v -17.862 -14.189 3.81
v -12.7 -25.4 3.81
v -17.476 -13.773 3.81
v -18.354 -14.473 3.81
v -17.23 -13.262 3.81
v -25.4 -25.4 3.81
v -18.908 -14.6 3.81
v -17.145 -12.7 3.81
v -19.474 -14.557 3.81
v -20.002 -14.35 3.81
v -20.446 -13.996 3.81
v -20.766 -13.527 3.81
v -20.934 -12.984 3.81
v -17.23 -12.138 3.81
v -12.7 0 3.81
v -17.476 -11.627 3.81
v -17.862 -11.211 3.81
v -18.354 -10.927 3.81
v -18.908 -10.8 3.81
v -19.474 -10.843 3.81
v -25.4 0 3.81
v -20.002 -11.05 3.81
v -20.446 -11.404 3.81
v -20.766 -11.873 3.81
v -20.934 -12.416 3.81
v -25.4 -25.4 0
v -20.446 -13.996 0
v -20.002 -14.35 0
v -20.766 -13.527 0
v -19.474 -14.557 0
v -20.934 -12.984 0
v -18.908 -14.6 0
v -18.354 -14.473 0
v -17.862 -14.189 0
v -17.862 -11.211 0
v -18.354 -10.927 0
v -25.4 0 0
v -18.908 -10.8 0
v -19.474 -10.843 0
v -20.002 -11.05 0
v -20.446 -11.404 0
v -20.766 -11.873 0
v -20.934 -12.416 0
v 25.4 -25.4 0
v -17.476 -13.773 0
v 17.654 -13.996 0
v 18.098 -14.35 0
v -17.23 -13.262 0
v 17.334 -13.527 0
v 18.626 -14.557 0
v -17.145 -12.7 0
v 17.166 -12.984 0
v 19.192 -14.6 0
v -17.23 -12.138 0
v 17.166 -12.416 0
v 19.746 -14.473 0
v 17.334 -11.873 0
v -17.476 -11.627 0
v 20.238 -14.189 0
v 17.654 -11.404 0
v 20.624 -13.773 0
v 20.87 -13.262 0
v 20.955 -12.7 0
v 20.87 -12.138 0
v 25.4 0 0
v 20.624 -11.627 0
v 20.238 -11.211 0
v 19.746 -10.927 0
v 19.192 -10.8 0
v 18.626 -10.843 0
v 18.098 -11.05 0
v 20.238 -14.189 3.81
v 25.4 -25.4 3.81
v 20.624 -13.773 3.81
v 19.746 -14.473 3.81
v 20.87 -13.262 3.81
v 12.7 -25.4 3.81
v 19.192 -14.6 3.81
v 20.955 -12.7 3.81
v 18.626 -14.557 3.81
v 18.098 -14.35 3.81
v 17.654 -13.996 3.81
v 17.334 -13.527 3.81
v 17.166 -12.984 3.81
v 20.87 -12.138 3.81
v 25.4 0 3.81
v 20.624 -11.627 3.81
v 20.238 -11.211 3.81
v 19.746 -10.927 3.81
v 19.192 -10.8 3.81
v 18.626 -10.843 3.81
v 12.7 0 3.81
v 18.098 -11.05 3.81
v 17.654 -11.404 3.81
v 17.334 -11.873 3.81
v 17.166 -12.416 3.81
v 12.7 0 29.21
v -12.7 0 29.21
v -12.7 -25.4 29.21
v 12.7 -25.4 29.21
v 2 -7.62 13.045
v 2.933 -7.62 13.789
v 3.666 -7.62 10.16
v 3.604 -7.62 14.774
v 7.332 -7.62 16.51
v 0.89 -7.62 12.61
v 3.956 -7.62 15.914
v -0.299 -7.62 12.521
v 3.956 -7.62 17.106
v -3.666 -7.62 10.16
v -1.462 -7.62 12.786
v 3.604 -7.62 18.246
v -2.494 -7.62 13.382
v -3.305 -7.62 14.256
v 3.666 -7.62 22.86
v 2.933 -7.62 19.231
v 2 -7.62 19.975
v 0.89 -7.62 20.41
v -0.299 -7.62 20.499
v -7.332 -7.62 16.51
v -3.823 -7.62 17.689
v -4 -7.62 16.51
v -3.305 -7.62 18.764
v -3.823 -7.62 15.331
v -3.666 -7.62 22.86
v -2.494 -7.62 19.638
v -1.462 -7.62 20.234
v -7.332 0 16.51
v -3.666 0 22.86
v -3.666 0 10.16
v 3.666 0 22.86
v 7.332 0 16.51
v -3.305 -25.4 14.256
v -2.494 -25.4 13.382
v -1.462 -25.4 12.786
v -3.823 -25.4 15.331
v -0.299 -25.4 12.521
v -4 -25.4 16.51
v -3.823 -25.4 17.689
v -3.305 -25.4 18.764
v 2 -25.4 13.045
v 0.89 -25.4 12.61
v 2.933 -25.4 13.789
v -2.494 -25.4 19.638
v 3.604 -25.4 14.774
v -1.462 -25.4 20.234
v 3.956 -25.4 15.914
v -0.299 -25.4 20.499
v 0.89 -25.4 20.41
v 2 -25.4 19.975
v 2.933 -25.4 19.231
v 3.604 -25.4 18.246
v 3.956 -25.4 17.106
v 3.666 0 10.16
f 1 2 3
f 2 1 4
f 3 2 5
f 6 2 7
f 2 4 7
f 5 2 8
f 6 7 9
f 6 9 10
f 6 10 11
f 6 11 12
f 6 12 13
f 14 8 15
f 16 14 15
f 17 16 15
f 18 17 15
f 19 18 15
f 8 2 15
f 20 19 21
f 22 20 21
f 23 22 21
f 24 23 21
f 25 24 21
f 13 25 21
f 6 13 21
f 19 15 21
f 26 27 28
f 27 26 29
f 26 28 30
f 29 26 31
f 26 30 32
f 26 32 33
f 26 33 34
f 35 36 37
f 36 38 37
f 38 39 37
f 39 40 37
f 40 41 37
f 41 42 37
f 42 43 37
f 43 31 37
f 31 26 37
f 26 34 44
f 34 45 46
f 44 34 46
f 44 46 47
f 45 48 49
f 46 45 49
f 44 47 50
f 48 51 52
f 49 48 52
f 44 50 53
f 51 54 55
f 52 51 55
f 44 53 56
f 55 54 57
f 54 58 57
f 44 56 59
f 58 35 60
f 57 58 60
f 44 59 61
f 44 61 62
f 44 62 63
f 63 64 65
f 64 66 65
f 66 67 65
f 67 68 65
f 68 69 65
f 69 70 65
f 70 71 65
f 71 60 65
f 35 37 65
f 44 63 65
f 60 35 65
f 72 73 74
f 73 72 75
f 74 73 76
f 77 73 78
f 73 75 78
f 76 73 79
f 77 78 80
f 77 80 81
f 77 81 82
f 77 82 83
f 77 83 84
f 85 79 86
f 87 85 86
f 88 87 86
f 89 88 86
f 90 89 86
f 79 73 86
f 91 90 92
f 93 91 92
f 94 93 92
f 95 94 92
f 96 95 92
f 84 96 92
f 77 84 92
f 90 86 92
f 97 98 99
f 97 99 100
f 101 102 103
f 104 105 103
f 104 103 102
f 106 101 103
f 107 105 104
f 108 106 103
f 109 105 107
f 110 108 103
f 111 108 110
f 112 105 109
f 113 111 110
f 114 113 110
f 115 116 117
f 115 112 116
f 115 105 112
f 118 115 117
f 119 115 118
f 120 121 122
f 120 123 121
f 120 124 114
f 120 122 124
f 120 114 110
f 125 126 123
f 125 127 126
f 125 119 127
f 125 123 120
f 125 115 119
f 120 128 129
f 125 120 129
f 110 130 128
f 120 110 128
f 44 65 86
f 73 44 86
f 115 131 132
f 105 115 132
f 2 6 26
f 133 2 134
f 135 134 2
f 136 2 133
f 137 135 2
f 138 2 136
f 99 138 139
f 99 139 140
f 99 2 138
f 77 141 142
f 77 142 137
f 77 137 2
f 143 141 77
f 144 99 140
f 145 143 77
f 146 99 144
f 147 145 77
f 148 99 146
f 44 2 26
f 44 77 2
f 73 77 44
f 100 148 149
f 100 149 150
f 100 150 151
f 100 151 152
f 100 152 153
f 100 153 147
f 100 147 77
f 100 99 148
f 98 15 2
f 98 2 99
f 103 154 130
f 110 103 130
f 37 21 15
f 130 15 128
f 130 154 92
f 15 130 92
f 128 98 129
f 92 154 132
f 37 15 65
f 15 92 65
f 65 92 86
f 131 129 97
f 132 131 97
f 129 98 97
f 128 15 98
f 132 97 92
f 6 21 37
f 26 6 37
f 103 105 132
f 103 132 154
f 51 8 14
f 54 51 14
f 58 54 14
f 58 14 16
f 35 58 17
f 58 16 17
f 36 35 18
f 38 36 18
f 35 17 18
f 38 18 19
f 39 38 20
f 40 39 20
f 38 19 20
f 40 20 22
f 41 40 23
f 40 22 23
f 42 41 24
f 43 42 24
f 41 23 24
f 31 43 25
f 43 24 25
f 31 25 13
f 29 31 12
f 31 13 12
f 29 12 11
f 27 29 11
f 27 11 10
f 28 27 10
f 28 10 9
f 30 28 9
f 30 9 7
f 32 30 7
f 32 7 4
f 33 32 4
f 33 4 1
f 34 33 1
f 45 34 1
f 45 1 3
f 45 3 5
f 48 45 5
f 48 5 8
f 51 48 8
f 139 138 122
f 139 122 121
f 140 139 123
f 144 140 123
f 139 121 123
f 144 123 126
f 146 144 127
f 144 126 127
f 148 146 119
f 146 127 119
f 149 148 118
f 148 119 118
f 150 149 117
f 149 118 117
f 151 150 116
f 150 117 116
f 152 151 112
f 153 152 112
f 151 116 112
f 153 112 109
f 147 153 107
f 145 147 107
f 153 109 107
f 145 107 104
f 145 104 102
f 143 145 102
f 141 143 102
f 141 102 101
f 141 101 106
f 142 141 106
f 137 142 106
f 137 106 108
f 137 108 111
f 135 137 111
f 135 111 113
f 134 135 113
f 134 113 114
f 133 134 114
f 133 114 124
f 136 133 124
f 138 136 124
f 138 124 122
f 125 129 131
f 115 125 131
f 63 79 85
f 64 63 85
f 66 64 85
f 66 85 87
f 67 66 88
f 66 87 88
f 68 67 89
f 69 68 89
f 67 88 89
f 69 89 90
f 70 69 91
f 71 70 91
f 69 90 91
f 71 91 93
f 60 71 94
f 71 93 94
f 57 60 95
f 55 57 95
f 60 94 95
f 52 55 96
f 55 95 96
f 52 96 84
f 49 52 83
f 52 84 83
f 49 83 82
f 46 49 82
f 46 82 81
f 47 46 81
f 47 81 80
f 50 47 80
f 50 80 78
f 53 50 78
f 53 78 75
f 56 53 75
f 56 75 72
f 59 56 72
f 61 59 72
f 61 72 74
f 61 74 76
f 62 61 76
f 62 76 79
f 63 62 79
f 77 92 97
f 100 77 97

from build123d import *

# Parameters (mm, degrees)
F0_W     = 25.4
F0_H     = 25.4
F1_DEPTH = 25.4
F2_R     = 4.0005
F3_DEPTH = 25.401
F4_R     = 4.0005
F5_DEPTH = 7.62
F6_R     = 1.905
F7_DEPTH = 25.4


with BuildPart() as f1:
    # F0 (on Front) → F1 (new body)
    with BuildSketch(Plane.XZ):
        with Locations((0, 16.51)):
            Rectangle(F0_W, F0_H)
        Polygon((-25.4, 3.81), (-25.4, 0), (25.4, 0), (25.4, 3.81), (12.7, 3.81), (-12.7, 3.81), align=None)
    extrude(amount=F1_DEPTH)

    # F2 (on face) → F3 (cut, through all)
    with BuildSketch(Plane(origin=(0, 0, 0), x_dir=(-1, 0, 0), z_dir=(0, 1, 0))):
        with Locations((0, 16.51)):
            Circle(F2_R)
    extrude(amount=-F3_DEPTH, mode=Mode.SUBTRACT)

    # F4 (on face) → F5 (cut)
    with BuildSketch(Plane(origin=(0, 0, 0), x_dir=(-1, 0, 0), z_dir=(0, 1, 0))):
        Polygon((7.332348, 16.51), (3.666174, 22.86), (-3.666174, 22.86), (-7.332348, 16.51), (-3.666174, 10.16), (3.666174, 10.16), align=None)
        with Locations((0, 16.51)):
            Circle(F4_R, mode=Mode.SUBTRACT)
    extrude(amount=-F5_DEPTH, mode=Mode.SUBTRACT)

    # F6 (on face) → F7 (cut)
    with BuildSketch(Plane.XY.offset(3.81)):
        with Locations((-19.05, -12.7)):
            Circle(F6_R)
        with Locations((19.05, -12.7)):
            Circle(F6_R)
    extrude(amount=-F7_DEPTH, mode=Mode.SUBTRACT)


solid = f1.part
